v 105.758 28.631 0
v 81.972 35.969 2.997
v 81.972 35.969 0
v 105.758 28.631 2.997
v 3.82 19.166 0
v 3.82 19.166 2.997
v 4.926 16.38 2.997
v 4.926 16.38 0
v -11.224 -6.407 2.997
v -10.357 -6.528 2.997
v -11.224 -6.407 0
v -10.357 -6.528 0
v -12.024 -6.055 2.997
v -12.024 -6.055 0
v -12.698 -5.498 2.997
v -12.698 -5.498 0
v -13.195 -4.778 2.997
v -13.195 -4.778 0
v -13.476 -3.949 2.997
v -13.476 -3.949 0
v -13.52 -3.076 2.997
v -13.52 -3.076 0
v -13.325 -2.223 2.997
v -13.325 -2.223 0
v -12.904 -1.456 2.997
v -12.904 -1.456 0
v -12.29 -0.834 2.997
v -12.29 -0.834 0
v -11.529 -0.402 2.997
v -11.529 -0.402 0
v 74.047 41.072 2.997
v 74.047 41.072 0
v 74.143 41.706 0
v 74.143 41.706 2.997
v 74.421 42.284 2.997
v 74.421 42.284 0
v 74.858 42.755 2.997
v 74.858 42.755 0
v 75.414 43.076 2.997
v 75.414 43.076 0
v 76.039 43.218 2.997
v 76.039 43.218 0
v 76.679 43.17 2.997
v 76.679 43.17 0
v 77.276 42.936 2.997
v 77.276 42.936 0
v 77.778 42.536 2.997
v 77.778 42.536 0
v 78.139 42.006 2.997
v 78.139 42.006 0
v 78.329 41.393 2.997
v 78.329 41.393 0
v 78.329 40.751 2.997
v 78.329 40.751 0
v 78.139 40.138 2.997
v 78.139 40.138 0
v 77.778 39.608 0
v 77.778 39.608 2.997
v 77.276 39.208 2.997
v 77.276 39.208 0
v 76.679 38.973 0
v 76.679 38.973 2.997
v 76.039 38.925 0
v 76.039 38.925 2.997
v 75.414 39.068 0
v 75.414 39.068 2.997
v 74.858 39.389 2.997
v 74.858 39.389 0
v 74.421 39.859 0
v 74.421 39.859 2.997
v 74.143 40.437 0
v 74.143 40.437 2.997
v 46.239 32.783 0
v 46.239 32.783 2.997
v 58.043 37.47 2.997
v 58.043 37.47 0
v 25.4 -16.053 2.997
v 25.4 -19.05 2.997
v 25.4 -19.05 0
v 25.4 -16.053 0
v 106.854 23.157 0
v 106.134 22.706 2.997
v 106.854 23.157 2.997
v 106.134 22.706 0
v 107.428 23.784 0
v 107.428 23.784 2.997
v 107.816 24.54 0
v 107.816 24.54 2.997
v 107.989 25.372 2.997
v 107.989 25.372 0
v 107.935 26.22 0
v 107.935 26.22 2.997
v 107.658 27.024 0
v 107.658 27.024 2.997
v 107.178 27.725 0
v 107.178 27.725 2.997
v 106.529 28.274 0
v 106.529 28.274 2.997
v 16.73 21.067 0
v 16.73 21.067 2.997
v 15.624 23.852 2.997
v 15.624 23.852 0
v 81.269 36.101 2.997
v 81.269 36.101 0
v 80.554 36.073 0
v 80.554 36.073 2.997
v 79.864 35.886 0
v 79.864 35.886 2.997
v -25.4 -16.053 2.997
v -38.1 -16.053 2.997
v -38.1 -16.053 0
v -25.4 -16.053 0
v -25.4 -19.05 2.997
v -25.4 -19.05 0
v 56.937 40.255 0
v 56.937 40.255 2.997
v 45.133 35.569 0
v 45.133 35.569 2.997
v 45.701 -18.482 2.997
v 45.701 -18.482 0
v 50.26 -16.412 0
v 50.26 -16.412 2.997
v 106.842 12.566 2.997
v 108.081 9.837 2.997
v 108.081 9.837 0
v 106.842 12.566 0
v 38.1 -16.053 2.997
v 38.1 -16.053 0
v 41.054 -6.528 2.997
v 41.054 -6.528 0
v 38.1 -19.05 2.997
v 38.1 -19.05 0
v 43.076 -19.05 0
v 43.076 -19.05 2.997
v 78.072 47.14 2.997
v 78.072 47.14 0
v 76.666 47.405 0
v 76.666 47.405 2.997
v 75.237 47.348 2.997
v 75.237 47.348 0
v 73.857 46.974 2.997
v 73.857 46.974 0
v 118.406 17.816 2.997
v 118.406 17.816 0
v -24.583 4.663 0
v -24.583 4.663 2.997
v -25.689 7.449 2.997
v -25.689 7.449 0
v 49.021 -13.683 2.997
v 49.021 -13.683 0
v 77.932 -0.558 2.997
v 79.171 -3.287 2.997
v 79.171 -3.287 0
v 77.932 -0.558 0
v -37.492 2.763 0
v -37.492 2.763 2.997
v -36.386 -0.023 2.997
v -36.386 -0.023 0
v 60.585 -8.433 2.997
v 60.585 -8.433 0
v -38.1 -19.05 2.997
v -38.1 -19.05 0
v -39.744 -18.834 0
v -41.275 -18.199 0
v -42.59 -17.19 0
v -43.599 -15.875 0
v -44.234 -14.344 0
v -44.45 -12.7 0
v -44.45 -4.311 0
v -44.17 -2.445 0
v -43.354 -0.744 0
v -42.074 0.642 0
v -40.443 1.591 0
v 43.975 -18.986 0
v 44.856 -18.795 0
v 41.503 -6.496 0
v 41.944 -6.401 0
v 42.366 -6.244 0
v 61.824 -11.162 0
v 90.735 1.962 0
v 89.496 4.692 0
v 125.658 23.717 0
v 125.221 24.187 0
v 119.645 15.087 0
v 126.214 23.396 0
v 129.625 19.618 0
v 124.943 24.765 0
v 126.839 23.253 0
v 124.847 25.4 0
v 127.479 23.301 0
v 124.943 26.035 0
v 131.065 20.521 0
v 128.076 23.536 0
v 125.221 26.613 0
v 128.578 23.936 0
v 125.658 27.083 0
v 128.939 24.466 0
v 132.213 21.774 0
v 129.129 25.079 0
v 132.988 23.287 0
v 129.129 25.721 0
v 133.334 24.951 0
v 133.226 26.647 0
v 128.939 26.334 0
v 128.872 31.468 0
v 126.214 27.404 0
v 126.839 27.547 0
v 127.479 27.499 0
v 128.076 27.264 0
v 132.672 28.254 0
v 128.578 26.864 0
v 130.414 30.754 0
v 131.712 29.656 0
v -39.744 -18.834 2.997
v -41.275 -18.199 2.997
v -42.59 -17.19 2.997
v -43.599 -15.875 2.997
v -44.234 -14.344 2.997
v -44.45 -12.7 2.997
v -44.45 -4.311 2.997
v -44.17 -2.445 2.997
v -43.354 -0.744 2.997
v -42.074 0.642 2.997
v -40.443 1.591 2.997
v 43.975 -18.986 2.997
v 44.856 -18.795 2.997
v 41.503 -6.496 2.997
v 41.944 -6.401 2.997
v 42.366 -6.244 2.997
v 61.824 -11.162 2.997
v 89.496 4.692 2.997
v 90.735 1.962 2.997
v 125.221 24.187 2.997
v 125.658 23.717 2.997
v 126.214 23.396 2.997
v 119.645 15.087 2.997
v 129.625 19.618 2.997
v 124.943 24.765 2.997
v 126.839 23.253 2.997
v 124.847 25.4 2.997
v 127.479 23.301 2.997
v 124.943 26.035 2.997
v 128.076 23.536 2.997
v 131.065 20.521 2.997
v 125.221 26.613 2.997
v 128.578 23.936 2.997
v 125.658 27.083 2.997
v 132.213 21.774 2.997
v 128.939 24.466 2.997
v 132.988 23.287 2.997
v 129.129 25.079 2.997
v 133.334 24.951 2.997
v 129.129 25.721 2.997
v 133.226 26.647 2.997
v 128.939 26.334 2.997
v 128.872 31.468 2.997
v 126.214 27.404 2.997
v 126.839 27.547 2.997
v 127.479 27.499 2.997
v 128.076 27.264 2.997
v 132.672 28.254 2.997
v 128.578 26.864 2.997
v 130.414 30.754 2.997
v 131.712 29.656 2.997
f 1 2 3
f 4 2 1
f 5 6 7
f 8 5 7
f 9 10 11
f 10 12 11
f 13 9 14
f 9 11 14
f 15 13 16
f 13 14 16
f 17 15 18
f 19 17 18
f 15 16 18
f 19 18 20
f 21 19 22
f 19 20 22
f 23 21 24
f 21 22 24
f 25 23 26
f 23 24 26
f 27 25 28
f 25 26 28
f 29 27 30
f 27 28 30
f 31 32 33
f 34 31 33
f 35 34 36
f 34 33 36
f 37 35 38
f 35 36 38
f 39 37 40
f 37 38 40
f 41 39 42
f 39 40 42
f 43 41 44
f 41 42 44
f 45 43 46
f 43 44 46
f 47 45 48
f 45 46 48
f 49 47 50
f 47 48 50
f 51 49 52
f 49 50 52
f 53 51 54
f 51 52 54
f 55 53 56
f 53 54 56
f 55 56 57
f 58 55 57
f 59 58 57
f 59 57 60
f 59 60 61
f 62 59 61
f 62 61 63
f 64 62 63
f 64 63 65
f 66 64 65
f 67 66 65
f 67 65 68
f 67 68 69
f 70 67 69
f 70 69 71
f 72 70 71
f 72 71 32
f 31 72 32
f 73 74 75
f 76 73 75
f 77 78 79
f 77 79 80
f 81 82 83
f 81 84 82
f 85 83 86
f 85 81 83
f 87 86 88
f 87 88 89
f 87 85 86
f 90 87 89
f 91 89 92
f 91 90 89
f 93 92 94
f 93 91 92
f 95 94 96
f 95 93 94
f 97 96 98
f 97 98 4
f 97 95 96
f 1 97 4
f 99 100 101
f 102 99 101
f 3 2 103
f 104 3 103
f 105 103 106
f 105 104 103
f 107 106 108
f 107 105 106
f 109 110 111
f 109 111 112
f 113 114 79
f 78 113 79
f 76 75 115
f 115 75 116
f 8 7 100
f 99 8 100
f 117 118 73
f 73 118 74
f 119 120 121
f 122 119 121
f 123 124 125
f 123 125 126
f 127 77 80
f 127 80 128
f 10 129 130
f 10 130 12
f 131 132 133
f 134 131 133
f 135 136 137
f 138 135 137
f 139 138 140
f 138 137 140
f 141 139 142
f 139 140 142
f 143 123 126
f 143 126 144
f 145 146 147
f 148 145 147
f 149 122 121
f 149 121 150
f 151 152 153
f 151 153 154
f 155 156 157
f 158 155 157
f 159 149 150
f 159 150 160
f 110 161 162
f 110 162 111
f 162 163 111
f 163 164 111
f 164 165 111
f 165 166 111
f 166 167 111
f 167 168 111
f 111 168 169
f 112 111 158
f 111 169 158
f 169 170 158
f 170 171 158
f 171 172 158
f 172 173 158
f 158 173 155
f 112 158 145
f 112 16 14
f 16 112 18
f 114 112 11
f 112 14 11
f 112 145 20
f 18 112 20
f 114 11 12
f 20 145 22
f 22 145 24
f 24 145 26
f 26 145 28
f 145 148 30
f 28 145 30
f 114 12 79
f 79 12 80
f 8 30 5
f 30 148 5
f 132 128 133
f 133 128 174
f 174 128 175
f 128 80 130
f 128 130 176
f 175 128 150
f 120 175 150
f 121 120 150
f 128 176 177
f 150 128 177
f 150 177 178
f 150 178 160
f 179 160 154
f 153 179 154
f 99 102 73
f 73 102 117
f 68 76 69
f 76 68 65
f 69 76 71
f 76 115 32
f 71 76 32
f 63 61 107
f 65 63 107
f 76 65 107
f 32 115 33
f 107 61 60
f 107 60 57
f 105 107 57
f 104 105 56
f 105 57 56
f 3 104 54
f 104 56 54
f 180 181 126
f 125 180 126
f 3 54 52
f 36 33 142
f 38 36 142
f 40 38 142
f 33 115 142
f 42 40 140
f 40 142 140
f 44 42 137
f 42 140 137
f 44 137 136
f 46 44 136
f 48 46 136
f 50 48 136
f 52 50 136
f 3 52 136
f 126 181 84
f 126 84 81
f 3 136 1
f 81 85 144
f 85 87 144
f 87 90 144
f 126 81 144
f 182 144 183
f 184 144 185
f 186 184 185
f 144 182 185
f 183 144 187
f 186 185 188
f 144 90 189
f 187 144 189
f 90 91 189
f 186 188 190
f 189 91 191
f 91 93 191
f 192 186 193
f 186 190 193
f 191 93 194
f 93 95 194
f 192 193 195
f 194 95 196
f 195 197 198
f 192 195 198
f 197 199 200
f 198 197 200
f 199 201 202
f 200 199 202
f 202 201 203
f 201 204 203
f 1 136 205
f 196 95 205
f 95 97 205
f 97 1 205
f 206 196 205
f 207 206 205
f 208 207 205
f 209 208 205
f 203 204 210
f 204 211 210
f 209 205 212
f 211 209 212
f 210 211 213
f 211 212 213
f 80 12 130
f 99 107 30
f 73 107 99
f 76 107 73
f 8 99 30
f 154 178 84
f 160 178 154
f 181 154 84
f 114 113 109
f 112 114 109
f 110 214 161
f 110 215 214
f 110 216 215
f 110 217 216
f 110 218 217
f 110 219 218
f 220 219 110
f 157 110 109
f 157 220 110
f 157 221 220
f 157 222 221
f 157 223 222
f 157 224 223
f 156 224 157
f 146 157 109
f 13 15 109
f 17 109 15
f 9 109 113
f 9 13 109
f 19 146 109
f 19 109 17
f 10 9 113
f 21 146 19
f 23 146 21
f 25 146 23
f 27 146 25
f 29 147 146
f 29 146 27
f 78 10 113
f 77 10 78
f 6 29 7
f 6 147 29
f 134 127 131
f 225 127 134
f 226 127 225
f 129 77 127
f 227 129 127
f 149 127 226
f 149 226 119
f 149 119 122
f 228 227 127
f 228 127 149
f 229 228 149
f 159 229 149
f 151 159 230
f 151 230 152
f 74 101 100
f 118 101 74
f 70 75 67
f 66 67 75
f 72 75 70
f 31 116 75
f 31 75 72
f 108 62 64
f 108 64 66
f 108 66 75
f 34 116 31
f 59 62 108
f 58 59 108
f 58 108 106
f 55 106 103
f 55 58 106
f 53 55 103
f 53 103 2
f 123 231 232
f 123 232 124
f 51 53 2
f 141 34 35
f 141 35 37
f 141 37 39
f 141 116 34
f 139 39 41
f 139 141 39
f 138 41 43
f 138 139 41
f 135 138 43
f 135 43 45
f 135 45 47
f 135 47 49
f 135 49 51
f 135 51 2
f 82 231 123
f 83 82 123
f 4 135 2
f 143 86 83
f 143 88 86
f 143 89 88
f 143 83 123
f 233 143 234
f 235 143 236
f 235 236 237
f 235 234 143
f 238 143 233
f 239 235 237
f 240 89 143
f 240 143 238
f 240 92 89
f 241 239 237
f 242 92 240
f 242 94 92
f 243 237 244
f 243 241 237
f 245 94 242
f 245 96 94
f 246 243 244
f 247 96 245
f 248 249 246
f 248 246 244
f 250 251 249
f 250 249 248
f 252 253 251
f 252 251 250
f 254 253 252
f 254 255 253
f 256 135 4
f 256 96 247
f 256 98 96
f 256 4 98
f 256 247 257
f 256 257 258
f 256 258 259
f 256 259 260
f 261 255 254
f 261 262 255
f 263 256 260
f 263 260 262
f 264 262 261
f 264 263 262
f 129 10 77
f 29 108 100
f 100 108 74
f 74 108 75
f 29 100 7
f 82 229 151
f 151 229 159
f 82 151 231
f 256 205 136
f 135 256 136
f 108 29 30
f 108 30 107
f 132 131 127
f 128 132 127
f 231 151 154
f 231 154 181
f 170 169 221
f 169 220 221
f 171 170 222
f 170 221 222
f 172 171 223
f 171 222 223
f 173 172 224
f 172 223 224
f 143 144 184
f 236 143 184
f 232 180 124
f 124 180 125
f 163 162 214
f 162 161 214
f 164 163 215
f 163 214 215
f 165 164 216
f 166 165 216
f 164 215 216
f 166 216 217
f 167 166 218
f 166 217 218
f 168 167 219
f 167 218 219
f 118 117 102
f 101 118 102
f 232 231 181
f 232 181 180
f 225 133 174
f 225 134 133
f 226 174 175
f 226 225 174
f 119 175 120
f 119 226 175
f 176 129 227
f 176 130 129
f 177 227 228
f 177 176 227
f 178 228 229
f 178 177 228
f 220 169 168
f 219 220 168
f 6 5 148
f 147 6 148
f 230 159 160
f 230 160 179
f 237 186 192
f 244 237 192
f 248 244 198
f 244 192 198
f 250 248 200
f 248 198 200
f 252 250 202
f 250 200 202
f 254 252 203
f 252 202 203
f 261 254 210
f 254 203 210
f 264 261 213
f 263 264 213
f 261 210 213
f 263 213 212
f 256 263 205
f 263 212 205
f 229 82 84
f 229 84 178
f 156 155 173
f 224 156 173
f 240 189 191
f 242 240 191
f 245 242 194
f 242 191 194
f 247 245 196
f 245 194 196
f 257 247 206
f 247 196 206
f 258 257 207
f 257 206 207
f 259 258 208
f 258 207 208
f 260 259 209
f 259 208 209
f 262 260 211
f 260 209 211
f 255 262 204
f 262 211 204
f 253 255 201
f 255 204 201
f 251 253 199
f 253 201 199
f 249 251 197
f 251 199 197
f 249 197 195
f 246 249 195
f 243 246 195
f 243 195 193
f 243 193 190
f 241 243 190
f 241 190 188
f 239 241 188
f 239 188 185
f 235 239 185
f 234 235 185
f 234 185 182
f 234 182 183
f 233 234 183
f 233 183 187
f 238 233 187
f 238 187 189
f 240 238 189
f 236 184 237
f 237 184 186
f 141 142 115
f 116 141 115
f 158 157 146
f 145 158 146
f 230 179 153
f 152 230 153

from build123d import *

# Parameters (mm, degrees)
BASE_DEPTH              = 2.9972
JOINT_HOLES_D           = 4.3053
JOINT_HOLES_DEPTH       = 6.351016
OUTER_FILLET_R          = 6.35
SKETCH5_W               = 12.7
SKETCH5_H               = 2.9972
BASE_PLATE_SLOTS_DEPTH  = 142.562822885
UNDER_PLATE_SLOTS_DEPTH = 142.562822885
TOP_PLATE_SLOTS_DEPTH   = 142.562822885
INNER_HOLE_DEPTH        = 142.562822885
INNER_FILLET_R          = 3.175


with BuildPart() as part:
    # Sketch2 → Base (new body)
    with BuildSketch(Plane.XY):
        with BuildLine():
            Line((-44.45, -19.05), (44.45, -19.05))
            Line((44.45, -19.05), (129.624951321, 19.617947547))
            ThreePointArc((129.624951321, 19.617947547), (133.337217148, 25.802714314), (128.871921697, 31.467817496))
            Line((128.871921697, 31.467817496), (78.071921697, 47.139617496))
            ThreePointArc((78.071921697, 47.139617496), (75.950116907, 47.416881437), (73.856688269, 46.973612445))
            Line((73.856688269, 46.973612445), (-44.45, 0))
            Line((-44.45, 0), (-44.45, -19.05))
        make_face()
    extrude(amount=BASE_DEPTH)

    # Joint holes
    with Locations(Plane.XY.offset(2.9972)):
        with Locations((76.2, 41.0718), (127, 25.4)):
            Hole(JOINT_HOLES_D / 2, depth=JOINT_HOLES_DEPTH)

    # Outer fillet
    outer_fillet_edges = [part.edges().sort_by_distance(p)[0] for p in [
        (-44.45, 0, 1.4986),
        (44.45, -19.05, 1.4986),
        (-44.45, -19.05, 1.4986),
    ]]
    fillet(outer_fillet_edges, radius=OUTER_FILLET_R)

    # Sketch5 → Base plate slots (cut, through all)
    with BuildSketch(Plane.XY.offset(2.9972)):
        with Locations((-31.75, -17.5514)):
            Rectangle(SKETCH5_W, SKETCH5_H)
        with Locations((31.75, -17.5514)):
            Rectangle(SKETCH5_W, SKETCH5_H)
    extrude(amount=-BASE_PLATE_SLOTS_DEPTH, mode=Mode.SUBTRACT)

    # Sketch6 → Under plate slots (cut, through all)
    with BuildSketch(Plane.XY.offset(2.9972)):
        Polygon((50.260345678, -16.412204047), (49.021368655, -13.683075289), (60.58547356, -8.433172648), (61.824450584, -11.162301405), align=None)
        Polygon((79.170607941, -3.287447443), (77.931630918, -0.558318686), (89.495735823, 4.691583955), (90.734712847, 1.962455198), align=None)
        Polygon((108.080870204, 9.83730916), (106.841893181, 12.566437917), (118.405998086, 17.816340558), (119.644975109, 15.087211801), align=None)
    extrude(amount=-UNDER_PLATE_SLOTS_DEPTH, mode=Mode.SUBTRACT)

    # Sketch7 → Top plate slots (cut, through all)
    with BuildSketch(Plane.XY.offset(2.9972)):
        Polygon((-37.492405509, 2.762509474), (-36.386362372, -0.023146), (-24.582737483, 4.663477462), (-25.68878062, 7.449132936), align=None)
        Polygon((3.820281603, 19.165691592), (4.92632474, 16.380036118), (16.729949629, 21.06665958), (15.623906492, 23.852315054), align=None)
        Polygon((45.132968715, 35.56887371), (46.239011852, 32.783218236), (58.042636741, 37.469841698), (56.936593604, 40.255497172), align=None)
    extrude(amount=-TOP_PLATE_SLOTS_DEPTH, mode=Mode.SUBTRACT)

    # Sketch8 → Inner hole (cut, through all)
    with BuildSketch(Plane.XY.offset(2.9972)):
        Polygon((-26.957611693, -6.5278), (80.903097736, 36.298241679), (113.752323838, 26.164255426), (41.740634412, -6.5278), align=None)
    extrude(amount=-INNER_HOLE_DEPTH, mode=Mode.SUBTRACT)

    # Inner fillet
    inner_fillet_edges = [part.edges().sort_by_distance(p)[0] for p in [
        (41.740634412, -6.5278, 1.4986),
        (-26.957611693, -6.5278, 1.4986),
        (80.903097736, 36.298241679, 1.4986),
        (113.752323838, 26.164255426, 1.4986),
    ]]
    fillet(inner_fillet_edges, radius=INNER_FILLET_R)


solid = part.part
